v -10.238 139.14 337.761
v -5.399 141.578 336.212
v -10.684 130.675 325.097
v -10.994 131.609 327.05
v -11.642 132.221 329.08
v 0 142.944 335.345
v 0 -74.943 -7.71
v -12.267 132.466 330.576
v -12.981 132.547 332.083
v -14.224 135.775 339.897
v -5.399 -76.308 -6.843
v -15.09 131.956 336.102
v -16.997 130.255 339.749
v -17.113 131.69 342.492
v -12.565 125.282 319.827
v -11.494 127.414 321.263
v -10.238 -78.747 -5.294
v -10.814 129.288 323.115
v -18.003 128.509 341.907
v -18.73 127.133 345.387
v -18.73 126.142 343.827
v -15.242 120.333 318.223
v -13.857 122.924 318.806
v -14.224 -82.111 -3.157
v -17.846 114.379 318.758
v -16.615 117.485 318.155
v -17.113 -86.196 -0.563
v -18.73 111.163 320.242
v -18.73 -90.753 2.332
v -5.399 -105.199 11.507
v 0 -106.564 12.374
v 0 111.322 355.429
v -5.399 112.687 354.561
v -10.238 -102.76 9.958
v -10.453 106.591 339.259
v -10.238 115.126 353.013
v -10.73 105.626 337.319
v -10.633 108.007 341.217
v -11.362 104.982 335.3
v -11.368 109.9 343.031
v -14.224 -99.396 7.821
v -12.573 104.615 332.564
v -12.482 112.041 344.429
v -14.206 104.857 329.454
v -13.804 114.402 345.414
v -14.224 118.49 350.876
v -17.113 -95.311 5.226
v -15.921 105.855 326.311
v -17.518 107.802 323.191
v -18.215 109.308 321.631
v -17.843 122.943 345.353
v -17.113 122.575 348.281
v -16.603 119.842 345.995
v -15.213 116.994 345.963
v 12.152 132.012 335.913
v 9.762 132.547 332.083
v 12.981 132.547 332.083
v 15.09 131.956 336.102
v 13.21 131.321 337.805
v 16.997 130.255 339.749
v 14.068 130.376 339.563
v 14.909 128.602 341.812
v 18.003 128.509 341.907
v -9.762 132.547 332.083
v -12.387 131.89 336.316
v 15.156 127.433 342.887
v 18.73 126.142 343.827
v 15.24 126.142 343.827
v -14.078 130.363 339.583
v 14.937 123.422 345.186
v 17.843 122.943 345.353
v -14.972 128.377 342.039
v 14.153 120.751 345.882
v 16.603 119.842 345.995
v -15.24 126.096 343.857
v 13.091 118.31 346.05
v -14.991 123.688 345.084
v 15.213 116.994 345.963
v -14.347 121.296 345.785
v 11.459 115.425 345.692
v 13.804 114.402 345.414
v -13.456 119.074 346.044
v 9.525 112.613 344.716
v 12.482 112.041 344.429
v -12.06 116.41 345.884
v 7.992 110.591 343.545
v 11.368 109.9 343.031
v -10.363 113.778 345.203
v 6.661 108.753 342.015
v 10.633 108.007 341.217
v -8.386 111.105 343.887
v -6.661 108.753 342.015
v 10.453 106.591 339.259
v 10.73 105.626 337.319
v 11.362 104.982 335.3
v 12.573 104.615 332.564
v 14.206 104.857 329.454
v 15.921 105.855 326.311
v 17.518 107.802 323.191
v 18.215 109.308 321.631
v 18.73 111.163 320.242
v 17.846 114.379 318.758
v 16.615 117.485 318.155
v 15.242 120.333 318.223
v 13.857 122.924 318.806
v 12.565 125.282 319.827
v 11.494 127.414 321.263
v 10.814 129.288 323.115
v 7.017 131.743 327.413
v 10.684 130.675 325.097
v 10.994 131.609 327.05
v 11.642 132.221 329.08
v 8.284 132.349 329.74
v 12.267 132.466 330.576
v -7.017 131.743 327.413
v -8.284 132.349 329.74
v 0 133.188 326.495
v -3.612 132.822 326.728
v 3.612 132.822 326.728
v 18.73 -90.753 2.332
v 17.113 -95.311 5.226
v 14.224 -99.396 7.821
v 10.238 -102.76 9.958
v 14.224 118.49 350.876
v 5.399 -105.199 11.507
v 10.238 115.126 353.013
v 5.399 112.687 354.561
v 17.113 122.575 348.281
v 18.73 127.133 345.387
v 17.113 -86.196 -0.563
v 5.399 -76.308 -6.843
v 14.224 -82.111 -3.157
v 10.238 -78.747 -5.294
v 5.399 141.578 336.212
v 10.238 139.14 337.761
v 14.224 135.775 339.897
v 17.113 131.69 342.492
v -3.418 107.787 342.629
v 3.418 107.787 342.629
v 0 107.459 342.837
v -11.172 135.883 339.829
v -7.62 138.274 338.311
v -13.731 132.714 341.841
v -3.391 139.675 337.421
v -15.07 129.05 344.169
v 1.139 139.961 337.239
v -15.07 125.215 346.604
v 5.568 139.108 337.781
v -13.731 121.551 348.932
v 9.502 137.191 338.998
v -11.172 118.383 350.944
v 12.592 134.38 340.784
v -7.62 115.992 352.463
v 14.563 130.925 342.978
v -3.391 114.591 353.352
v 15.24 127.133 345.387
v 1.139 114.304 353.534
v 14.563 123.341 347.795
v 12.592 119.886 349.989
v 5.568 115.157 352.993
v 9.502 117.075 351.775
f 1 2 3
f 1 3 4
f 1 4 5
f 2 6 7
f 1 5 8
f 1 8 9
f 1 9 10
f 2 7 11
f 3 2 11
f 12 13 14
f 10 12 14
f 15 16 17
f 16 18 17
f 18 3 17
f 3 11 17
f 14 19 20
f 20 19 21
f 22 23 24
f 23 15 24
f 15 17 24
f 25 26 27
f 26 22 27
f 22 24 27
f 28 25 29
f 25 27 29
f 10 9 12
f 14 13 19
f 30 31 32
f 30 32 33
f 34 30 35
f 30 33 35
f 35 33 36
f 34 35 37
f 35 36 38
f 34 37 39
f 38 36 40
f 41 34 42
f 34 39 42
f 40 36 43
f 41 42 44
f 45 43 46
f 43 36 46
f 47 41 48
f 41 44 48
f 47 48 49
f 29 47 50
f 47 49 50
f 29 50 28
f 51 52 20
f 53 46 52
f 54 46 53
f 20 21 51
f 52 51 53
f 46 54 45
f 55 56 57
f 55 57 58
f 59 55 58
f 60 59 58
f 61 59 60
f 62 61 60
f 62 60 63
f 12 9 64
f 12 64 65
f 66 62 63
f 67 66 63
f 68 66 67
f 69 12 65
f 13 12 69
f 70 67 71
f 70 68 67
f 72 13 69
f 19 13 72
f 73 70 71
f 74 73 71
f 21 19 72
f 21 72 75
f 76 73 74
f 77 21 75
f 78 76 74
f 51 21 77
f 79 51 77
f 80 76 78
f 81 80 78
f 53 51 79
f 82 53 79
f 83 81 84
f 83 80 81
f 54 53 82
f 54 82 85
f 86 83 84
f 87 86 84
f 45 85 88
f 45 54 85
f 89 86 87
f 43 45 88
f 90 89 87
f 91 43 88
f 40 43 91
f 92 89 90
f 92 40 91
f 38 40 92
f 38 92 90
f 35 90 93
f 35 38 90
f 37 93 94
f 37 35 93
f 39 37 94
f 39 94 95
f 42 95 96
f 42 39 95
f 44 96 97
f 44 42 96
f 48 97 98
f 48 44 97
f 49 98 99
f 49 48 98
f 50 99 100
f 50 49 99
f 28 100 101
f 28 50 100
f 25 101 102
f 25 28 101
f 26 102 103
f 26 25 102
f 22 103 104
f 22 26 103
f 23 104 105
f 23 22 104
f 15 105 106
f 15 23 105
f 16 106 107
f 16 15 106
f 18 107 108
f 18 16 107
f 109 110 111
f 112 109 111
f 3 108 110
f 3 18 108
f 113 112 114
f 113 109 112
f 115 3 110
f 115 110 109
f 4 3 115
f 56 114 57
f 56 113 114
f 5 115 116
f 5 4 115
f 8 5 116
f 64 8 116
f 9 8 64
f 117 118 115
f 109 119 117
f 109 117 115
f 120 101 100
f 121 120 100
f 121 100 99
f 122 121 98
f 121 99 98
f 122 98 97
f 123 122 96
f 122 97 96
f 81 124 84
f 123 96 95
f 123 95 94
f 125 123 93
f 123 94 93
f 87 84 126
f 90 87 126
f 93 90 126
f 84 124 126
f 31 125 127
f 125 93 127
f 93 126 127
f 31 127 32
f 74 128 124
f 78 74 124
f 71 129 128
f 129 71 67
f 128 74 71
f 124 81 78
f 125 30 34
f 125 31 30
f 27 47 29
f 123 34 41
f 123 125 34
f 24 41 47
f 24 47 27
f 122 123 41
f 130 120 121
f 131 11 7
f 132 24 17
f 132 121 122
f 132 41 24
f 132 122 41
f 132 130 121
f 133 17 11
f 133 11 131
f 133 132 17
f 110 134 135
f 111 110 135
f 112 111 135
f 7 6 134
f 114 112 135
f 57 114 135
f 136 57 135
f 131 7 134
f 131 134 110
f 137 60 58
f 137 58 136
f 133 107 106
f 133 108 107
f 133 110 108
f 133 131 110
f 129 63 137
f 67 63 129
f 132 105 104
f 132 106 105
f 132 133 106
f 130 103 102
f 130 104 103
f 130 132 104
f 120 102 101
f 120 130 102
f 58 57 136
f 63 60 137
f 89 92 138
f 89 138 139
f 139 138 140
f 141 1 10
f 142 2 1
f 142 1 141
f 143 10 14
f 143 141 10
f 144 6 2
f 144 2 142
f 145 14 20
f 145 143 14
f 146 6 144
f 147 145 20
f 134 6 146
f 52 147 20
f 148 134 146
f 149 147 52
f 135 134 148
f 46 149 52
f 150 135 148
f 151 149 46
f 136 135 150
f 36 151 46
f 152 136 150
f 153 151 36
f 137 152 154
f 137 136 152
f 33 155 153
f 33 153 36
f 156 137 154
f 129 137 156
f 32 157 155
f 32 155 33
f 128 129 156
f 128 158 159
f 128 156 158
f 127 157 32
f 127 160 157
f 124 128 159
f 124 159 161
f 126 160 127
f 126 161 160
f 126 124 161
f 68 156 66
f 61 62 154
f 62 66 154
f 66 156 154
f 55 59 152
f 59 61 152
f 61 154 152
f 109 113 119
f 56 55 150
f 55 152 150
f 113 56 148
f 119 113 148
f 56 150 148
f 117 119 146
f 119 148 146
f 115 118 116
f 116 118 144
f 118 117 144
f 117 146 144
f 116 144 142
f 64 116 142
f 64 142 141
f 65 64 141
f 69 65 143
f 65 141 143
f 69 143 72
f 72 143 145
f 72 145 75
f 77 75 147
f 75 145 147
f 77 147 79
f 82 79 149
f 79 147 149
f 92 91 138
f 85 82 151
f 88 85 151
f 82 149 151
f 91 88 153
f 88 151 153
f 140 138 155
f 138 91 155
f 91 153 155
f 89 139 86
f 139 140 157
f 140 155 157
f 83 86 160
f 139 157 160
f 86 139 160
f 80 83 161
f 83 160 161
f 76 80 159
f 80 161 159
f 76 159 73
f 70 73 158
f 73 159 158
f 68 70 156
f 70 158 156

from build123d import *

# Parameters (mm, degrees)
F0_R        = 13.97
F1_DEPTH    = 19.05
F2_T1_DEPTH = 520.7
F2_T3_DEPTH = 520.7
F3_R        = 15.24
F4_DEPTH    = 12.7


# Not quite as in the source:
# - a fillet or chamfer that OpenCascade refuses, or shapes differently, is made with other operations: its cross-section is extruded or revolved along the edge and cut away or added


with BuildPart() as f1:
    # F0 (on Right) → F1 (new body, symmetric)
    with BuildSketch(Plane.YZ):
        Polygon((143.2134641072, 335.1731732972), (111.0520780853, 355.6), (-106.8340734116, 12.545215766), (-74.6726873897, -7.8816109369), align=None)
        with Locations((118.576942247, 332.0826940597)):
            Circle(F0_R, mode=Mode.SUBTRACT)
    extrude(amount=F1_DEPTH, both=True)

    # F2: fillet of radius 22.86 on 4 edges, made by hand

    # F2_s2 → F2_t1 (cut)
    with BuildSketch(Plane(origin=(0, 223.4952640736, 351.8861527791), x_dir=(1, 0, 0), z_dir=(0, -0.5361371838, -0.8441308667))):
        with BuildLine():
            ThreePointArc((19.05, 74.0478956349), (12.3544610179, 90.2123566528), (-3.81, 96.9078956349))
            Line((-3.81, 96.9078956349), (19.05, 96.9078956349))
            Line((19.05, 96.9078956349), (19.05, 74.0478956349))
        make_face()
        with BuildLine():
            ThreePointArc((3.81, 96.9078956349), (-12.3544610179, 90.2123566528), (-19.05, 74.0478956349))
            Line((-19.05, 74.0478956349), (-19.05, 96.9078956349))
            Line((-19.05, 96.9078956349), (3.81, 96.9078956349))
        make_face()
    extrude(amount=F2_T1_DEPTH, mode=Mode.SUBTRACT)

    # F2_s4 → F2_t3 (cut)
    with BuildSketch(Plane(origin=(0, -55.6713675318, -87.6527895208), x_dir=(1, 0, 0), z_dir=(0, 0.5361371838, 0.8441308667))):
        with BuildLine():
            ThreePointArc((-3.81, -58.8078956349), (12.3544610179, -65.5034346169), (19.05, -81.6678956349))
            Line((19.05, -81.6678956349), (19.05, -58.8078956349))
            Line((19.05, -58.8078956349), (-3.81, -58.8078956349))
        make_face()
        with BuildLine():
            ThreePointArc((3.81, -58.8078956349), (-12.3544610179, -65.5034346169), (-19.05, -81.6678956349))
            Line((-19.05, -81.6678956349), (-19.05, -58.8078956349))
            Line((-19.05, -58.8078956349), (3.81, -58.8078956349))
        make_face()
    extrude(amount=F2_T3_DEPTH, mode=Mode.SUBTRACT)

    # F3 (on face) → F4 (cut, symmetric)
    with BuildSketch(Plane(origin=(0, 192.8550240193, 303.6440737462), x_dir=(1, 0, 0), z_dir=(0, 0.5361371838, 0.8441308667))):
        with Locations((0, -77.8578956349)):
            Circle(F3_R)
    extrude(amount=F4_DEPTH, both=True, mode=Mode.SUBTRACT)


solid = f1.part
